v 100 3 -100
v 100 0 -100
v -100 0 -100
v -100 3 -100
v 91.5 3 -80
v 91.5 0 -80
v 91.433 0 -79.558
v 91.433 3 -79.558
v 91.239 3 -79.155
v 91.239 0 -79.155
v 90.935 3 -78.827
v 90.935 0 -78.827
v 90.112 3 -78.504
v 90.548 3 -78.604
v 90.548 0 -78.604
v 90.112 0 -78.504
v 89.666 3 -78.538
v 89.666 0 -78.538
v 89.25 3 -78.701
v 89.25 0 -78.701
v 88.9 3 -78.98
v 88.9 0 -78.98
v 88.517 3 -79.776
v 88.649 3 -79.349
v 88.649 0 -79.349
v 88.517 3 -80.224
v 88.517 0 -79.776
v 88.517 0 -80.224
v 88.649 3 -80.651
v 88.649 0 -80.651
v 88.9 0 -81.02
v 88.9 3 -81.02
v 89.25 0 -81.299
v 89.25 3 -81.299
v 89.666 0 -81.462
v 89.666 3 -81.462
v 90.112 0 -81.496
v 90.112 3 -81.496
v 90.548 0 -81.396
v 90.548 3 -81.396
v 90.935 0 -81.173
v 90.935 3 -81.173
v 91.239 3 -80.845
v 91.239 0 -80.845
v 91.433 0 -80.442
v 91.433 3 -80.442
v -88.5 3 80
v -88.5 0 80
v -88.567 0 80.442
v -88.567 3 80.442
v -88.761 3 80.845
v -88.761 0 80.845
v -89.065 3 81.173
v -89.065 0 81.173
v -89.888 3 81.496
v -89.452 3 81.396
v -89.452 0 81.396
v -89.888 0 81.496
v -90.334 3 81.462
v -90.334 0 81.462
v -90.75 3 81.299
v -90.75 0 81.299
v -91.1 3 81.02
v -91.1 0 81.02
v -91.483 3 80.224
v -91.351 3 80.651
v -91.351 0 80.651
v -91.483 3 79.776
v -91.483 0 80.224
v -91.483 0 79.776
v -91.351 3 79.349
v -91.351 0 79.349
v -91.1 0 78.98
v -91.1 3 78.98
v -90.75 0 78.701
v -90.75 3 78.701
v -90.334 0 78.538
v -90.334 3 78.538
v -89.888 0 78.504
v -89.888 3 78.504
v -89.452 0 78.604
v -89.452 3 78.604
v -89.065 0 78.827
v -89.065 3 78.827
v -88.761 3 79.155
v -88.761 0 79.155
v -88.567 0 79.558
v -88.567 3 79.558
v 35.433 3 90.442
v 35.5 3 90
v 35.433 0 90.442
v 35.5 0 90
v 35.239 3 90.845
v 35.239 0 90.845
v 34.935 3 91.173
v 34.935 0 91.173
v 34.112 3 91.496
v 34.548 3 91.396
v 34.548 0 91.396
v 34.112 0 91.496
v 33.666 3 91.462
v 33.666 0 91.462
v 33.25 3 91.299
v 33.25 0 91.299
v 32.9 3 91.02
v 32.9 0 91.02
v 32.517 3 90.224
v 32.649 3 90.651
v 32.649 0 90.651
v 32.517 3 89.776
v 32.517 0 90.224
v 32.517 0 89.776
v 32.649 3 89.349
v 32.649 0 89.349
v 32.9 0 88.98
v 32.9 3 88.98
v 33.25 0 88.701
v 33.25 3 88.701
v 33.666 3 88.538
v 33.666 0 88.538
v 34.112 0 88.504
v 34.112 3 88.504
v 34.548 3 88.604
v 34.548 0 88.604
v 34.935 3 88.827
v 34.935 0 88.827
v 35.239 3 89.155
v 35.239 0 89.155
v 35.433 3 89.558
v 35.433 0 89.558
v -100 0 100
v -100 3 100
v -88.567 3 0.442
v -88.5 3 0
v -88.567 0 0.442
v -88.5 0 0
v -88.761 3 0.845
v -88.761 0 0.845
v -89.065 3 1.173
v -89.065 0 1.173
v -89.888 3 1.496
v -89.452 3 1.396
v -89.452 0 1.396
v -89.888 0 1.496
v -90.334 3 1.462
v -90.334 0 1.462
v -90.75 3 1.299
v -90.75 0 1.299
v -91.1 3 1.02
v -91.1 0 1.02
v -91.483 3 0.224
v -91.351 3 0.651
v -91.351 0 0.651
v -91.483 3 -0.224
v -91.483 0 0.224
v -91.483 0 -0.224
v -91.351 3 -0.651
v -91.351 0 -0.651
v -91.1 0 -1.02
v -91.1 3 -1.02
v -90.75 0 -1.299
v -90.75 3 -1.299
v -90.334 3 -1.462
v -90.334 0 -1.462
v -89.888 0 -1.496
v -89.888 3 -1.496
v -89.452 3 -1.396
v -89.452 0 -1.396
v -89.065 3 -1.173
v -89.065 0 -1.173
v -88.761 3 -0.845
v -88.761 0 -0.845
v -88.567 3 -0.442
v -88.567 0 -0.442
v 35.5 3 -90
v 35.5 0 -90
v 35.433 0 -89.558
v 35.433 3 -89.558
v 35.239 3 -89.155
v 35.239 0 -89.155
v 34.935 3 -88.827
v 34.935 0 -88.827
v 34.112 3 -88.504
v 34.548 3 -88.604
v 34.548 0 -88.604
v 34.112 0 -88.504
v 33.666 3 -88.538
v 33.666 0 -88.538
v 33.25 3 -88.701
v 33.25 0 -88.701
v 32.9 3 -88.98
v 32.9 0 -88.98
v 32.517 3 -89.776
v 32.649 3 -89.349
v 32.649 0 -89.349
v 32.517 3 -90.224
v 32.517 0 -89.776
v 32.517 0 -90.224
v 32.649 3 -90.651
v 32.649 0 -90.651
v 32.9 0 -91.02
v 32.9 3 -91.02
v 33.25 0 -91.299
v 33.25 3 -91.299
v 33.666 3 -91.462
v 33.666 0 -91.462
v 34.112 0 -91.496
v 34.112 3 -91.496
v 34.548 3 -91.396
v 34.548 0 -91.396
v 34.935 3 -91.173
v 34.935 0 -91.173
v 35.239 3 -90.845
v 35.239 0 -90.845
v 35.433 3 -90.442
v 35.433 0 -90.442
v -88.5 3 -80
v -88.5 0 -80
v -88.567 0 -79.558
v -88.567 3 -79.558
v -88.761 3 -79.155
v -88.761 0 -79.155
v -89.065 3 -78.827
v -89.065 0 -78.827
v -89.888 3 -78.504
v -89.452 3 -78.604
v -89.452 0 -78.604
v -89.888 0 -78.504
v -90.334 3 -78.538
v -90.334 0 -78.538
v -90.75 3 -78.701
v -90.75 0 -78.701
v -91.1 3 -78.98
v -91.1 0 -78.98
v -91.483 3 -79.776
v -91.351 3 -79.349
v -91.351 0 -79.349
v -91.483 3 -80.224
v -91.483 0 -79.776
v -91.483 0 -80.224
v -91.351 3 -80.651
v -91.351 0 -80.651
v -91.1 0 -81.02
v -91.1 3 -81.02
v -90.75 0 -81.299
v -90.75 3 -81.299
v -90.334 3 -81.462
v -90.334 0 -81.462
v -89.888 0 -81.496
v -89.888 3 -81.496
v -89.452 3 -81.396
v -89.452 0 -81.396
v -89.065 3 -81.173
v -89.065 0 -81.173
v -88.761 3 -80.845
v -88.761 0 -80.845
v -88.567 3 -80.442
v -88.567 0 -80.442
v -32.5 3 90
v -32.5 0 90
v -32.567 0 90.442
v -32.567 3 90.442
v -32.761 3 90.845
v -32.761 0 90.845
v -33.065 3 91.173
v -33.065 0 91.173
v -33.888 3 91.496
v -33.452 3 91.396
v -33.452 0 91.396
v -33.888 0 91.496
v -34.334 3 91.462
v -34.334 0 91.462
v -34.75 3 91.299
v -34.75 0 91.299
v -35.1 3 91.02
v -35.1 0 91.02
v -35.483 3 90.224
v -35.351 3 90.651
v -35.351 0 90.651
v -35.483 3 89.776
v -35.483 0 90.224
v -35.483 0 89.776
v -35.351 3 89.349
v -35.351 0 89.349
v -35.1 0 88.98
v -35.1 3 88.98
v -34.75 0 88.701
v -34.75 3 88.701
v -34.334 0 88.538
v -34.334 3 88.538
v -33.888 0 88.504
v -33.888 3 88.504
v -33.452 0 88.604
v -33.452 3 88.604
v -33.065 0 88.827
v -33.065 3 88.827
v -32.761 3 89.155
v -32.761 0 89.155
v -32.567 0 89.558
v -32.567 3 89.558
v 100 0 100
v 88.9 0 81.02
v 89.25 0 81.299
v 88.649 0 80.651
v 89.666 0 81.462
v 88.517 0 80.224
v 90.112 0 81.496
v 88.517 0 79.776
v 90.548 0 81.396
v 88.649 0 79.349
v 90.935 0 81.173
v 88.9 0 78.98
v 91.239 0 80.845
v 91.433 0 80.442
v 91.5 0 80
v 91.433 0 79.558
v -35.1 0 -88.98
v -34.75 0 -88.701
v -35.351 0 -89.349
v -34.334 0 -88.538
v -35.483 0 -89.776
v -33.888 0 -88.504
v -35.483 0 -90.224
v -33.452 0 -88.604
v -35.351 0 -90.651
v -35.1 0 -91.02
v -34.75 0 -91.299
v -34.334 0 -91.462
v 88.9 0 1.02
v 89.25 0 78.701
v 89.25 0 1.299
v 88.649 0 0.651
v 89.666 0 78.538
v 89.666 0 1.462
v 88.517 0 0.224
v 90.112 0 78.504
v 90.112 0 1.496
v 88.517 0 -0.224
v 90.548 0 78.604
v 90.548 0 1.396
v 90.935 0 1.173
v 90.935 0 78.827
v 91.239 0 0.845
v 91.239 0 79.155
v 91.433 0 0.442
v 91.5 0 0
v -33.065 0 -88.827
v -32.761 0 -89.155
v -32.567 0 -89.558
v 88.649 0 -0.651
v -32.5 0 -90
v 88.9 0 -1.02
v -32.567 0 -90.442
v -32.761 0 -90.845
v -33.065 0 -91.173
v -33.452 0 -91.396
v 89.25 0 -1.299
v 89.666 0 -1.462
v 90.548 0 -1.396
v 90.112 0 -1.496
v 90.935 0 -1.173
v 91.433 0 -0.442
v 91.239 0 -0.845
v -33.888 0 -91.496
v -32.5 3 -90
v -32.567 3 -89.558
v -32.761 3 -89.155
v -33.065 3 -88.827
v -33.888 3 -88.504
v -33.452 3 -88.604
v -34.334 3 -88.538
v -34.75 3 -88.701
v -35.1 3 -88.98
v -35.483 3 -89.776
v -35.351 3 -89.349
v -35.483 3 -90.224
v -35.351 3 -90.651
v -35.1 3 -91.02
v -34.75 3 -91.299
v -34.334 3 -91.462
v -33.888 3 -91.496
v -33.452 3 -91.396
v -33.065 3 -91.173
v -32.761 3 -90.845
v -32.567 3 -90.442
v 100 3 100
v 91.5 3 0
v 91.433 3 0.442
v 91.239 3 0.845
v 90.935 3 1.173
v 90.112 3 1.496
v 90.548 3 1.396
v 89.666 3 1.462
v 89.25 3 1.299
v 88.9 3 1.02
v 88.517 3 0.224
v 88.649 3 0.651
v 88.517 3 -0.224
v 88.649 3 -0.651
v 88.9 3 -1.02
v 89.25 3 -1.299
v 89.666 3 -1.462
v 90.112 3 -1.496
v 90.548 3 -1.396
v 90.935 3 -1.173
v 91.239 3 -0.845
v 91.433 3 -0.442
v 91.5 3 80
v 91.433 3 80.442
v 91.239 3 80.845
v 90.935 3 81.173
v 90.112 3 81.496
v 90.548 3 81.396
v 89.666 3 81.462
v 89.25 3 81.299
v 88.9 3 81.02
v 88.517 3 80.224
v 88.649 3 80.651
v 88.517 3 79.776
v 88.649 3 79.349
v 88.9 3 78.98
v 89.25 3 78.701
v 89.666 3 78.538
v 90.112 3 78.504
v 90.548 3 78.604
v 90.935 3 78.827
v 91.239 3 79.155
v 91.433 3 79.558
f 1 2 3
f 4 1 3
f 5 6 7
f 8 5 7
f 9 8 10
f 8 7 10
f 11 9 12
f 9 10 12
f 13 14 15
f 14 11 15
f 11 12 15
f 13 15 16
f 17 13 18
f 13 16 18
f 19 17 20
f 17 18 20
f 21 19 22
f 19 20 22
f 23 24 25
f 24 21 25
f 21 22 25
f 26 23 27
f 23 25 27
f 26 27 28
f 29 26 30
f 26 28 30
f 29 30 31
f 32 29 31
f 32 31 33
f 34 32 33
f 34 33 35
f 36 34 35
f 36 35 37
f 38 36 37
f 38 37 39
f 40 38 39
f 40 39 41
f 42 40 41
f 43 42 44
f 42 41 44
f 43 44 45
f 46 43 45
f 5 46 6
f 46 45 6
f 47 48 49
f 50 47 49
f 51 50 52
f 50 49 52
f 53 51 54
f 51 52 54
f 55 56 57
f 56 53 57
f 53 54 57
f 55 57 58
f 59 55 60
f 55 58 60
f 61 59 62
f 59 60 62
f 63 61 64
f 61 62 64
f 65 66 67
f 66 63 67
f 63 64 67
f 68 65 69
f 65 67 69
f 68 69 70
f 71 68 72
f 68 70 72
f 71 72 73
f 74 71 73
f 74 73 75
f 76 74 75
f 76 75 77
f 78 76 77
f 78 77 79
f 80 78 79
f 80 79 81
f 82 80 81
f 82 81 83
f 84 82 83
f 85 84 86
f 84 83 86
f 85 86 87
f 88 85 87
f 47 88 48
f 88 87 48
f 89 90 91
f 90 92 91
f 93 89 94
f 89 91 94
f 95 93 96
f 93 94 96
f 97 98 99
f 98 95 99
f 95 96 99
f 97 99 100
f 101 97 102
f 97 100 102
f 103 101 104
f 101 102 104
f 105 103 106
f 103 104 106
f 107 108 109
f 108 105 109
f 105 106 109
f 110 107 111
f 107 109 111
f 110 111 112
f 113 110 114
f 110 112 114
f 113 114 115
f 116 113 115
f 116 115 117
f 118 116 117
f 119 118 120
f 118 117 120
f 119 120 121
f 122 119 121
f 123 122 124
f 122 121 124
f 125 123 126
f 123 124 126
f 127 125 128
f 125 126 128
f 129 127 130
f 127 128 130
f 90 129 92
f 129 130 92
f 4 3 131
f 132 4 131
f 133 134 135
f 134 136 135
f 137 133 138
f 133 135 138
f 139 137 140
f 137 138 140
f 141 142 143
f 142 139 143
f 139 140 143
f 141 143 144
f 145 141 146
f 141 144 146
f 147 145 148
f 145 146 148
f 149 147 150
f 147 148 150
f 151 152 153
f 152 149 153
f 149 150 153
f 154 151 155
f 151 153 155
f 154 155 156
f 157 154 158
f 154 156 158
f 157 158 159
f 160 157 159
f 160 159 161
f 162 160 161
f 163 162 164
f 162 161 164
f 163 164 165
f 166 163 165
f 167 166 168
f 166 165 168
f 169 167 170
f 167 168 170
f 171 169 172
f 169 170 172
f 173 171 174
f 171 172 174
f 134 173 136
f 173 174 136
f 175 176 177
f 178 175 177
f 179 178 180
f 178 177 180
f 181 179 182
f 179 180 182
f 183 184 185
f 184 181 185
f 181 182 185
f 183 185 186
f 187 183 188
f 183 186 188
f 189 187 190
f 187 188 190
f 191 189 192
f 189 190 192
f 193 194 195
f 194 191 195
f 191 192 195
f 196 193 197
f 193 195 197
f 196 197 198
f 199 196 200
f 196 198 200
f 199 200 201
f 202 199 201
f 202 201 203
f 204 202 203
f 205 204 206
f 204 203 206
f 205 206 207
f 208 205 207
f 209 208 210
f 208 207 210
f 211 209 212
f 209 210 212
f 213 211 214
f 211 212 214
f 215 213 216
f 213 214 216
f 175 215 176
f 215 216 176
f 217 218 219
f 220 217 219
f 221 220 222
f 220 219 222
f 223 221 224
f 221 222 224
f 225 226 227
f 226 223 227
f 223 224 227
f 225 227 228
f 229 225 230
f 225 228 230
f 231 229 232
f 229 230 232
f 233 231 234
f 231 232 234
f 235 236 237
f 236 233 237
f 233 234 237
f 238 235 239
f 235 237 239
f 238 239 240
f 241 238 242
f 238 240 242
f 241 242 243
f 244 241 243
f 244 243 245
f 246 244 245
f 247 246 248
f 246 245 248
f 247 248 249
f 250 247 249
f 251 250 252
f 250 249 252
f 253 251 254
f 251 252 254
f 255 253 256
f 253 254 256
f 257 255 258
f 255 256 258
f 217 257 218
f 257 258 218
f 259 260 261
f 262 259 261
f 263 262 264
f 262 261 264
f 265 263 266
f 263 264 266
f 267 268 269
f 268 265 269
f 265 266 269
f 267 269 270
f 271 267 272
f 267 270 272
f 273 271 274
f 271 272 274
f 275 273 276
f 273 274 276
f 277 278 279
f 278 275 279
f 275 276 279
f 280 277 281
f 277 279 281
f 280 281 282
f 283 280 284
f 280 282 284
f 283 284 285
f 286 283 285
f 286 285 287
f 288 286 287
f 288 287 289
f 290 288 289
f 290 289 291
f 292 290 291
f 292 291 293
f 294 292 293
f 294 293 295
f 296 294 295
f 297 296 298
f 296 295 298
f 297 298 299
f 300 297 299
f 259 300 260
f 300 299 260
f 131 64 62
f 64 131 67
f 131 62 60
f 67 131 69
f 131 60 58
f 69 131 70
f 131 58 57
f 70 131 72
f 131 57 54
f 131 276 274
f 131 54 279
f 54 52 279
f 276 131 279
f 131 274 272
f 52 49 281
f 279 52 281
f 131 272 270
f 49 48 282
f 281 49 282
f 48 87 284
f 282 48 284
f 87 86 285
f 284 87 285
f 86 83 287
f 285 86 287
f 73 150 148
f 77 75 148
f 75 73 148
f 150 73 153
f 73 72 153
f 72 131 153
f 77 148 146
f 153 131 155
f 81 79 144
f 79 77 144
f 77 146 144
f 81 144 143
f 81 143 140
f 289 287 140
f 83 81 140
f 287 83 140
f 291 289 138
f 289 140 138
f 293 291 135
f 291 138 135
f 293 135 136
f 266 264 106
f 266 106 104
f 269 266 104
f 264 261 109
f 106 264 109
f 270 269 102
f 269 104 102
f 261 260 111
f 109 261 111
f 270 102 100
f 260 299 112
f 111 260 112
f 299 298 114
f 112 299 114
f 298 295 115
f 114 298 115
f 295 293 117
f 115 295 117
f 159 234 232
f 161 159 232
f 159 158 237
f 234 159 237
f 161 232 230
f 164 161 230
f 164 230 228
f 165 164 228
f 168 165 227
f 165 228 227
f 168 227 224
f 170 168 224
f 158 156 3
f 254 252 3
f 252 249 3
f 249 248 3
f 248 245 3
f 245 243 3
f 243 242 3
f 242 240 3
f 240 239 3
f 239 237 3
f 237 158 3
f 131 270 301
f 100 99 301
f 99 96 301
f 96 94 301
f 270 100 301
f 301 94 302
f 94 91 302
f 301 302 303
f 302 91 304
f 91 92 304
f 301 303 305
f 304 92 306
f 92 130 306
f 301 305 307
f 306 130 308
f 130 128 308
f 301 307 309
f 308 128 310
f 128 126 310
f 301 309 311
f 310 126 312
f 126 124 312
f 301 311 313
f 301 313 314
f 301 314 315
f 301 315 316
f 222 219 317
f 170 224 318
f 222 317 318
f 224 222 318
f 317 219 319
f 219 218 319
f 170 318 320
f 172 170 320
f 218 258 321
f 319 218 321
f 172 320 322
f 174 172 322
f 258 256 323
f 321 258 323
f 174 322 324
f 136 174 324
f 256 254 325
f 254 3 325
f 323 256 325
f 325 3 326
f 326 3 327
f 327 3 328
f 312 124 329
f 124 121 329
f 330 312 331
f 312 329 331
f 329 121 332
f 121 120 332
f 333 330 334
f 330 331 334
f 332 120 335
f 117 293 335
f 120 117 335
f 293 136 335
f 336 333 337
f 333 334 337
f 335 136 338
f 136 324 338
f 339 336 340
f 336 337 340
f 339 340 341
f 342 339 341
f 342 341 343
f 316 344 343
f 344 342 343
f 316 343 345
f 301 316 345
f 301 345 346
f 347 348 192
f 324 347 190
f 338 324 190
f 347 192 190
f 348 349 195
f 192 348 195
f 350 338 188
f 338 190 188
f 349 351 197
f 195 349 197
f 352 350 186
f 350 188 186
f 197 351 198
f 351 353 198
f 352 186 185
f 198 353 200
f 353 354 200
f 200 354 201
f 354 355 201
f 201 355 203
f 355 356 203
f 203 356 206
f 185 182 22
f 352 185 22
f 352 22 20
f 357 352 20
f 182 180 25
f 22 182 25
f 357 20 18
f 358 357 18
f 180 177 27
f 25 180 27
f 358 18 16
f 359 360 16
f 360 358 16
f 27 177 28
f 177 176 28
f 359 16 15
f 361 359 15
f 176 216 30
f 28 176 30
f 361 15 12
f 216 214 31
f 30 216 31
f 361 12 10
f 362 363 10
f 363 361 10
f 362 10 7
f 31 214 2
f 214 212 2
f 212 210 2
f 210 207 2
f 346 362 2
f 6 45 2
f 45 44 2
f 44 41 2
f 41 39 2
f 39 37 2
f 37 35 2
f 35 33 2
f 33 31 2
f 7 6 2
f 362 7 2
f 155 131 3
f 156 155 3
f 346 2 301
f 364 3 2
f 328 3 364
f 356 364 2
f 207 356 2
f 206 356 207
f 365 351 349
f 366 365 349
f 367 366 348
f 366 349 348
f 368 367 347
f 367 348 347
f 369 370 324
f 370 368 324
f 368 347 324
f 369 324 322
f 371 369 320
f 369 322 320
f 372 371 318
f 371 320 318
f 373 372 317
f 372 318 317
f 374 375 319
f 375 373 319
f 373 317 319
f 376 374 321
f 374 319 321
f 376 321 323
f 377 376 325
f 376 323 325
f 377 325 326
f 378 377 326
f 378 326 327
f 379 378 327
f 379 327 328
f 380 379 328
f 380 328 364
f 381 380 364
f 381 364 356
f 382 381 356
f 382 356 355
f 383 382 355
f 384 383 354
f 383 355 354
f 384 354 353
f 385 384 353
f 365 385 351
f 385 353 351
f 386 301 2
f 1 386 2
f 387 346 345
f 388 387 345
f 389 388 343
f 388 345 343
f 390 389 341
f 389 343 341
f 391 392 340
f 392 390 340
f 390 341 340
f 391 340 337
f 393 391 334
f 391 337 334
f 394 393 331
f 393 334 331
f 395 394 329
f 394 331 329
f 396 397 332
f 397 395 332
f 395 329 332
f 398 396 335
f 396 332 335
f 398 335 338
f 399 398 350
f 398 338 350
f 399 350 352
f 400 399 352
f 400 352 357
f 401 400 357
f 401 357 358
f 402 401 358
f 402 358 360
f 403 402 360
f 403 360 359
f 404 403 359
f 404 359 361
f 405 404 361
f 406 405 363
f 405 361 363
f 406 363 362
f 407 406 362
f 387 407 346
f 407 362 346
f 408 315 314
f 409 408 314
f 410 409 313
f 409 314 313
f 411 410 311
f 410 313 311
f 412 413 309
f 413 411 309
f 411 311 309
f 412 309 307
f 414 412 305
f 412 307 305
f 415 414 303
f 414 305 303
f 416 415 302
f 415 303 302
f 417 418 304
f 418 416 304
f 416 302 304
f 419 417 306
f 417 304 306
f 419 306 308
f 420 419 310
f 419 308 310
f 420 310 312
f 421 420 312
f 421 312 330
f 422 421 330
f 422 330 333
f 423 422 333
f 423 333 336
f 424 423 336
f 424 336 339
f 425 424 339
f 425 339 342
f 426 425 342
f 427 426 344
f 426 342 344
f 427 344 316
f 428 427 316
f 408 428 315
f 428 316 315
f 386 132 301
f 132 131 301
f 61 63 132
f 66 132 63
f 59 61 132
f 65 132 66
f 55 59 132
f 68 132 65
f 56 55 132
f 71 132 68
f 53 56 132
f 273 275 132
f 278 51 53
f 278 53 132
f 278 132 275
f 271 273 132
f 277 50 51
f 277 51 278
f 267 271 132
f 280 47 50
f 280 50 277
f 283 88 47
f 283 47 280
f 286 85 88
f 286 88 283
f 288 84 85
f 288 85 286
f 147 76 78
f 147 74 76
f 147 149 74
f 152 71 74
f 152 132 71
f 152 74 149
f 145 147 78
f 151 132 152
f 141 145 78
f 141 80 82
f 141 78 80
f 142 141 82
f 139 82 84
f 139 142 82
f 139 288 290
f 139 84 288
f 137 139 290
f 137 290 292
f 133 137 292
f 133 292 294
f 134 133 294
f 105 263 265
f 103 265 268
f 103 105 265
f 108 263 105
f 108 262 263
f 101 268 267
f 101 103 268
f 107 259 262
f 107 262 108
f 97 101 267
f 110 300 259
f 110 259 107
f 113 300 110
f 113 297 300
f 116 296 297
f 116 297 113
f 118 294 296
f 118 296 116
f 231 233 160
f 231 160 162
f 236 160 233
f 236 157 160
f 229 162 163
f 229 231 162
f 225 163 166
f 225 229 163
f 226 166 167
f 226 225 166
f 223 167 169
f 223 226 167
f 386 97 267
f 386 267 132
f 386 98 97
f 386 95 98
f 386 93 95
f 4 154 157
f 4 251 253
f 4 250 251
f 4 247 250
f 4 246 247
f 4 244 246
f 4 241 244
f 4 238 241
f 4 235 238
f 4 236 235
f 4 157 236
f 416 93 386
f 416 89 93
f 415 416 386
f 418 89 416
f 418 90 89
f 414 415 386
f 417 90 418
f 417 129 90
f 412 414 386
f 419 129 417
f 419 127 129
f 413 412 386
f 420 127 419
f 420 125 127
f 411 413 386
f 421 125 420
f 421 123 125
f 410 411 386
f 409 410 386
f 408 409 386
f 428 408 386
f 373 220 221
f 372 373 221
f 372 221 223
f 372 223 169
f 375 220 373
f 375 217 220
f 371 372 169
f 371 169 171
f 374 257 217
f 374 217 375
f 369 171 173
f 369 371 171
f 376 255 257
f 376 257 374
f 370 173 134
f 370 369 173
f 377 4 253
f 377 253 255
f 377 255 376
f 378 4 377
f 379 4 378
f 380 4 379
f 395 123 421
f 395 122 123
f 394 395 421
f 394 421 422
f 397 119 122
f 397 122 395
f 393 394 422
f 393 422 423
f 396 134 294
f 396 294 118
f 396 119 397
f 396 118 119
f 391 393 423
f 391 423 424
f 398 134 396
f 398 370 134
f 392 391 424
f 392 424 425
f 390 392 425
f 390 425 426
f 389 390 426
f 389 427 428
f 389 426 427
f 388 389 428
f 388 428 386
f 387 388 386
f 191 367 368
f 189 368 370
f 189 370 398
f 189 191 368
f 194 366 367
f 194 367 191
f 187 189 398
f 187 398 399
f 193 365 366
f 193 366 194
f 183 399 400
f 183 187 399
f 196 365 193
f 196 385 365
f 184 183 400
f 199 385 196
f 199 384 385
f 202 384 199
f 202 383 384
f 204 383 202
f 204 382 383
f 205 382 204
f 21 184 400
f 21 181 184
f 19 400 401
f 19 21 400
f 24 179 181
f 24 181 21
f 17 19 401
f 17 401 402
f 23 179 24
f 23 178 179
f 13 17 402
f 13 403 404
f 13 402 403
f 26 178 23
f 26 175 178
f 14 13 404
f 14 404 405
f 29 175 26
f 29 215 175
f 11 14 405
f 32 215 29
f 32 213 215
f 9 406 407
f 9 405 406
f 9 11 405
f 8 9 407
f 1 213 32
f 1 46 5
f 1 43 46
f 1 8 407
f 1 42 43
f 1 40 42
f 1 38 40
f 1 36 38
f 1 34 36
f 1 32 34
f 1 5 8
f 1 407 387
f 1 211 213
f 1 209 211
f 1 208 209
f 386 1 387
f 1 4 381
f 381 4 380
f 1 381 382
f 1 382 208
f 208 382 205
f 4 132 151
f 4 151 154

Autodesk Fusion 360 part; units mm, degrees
sketch "Sketch1" plane through (0, 0, 0) normal (0, 1, 0) x (1, 0, 0)
  line L0 (100, 100) -> (-100, 100)
  line L1 (-100, 100) -> (-100, -100)
  line L2 (-100, -100) -> (100, -100)
  line L3 (100, -100) -> (100, 100)
  line L4 (100, 100) -> (-100, -100) construction
  line L5 (-100, 100) -> (100, -100) construction
  circle A0 centre (90, -80) radius 1.5
  circle A1 centre (90, 0) radius 1.5
  circle A2 centre (90, 80) radius 1.5
  circle A3 centre (-90, 80) radius 1.5
  circle A4 centre (-90, 0) radius 1.5
  circle A5 centre (-90, -80) radius 1.5
  circle A6 centre (-34, -90) radius 1.5
  circle A7 centre (34, -90) radius 1.5
  circle A8 centre (-34, 90) radius 1.5
  circle A9 centre (34, 90) radius 1.5
  dimension "d1" = 200
  dimension "d2" = 200
  dimension "d3" = 3
  dimension "d4" = 3
  dimension "d5" = 3
  dimension "d6" = 3
  dimension "d7" = 3
  dimension "d8" = 3
  dimension "d9" = 10
  dimension "d10" = 20
  dimension "d11" = 10
  dimension "d12" = 10
  dimension "d13" = 20
  dimension "d14" = 100
  dimension "d15" = 10
  dimension "d16" = 20
  dimension "d17" = 100
  dimension "d18" = 10
  dimension "d19" = 10
  dimension "d20" = 20
  dimension "d21" = 3
  dimension "d22" = 3
  dimension "d23" = 3
  dimension "d24" = 3
  dimension "d25" = 10
  dimension "d26" = 10
  dimension "d27" = 66
  dimension "d28" = 66
  dimension "d29" = 10
  dimension "d30" = 10
  dimension "d31" = 66
  dimension "d32" = 66
extrude "Extrude1" add sketch "Sketch1" along normal blind 3
